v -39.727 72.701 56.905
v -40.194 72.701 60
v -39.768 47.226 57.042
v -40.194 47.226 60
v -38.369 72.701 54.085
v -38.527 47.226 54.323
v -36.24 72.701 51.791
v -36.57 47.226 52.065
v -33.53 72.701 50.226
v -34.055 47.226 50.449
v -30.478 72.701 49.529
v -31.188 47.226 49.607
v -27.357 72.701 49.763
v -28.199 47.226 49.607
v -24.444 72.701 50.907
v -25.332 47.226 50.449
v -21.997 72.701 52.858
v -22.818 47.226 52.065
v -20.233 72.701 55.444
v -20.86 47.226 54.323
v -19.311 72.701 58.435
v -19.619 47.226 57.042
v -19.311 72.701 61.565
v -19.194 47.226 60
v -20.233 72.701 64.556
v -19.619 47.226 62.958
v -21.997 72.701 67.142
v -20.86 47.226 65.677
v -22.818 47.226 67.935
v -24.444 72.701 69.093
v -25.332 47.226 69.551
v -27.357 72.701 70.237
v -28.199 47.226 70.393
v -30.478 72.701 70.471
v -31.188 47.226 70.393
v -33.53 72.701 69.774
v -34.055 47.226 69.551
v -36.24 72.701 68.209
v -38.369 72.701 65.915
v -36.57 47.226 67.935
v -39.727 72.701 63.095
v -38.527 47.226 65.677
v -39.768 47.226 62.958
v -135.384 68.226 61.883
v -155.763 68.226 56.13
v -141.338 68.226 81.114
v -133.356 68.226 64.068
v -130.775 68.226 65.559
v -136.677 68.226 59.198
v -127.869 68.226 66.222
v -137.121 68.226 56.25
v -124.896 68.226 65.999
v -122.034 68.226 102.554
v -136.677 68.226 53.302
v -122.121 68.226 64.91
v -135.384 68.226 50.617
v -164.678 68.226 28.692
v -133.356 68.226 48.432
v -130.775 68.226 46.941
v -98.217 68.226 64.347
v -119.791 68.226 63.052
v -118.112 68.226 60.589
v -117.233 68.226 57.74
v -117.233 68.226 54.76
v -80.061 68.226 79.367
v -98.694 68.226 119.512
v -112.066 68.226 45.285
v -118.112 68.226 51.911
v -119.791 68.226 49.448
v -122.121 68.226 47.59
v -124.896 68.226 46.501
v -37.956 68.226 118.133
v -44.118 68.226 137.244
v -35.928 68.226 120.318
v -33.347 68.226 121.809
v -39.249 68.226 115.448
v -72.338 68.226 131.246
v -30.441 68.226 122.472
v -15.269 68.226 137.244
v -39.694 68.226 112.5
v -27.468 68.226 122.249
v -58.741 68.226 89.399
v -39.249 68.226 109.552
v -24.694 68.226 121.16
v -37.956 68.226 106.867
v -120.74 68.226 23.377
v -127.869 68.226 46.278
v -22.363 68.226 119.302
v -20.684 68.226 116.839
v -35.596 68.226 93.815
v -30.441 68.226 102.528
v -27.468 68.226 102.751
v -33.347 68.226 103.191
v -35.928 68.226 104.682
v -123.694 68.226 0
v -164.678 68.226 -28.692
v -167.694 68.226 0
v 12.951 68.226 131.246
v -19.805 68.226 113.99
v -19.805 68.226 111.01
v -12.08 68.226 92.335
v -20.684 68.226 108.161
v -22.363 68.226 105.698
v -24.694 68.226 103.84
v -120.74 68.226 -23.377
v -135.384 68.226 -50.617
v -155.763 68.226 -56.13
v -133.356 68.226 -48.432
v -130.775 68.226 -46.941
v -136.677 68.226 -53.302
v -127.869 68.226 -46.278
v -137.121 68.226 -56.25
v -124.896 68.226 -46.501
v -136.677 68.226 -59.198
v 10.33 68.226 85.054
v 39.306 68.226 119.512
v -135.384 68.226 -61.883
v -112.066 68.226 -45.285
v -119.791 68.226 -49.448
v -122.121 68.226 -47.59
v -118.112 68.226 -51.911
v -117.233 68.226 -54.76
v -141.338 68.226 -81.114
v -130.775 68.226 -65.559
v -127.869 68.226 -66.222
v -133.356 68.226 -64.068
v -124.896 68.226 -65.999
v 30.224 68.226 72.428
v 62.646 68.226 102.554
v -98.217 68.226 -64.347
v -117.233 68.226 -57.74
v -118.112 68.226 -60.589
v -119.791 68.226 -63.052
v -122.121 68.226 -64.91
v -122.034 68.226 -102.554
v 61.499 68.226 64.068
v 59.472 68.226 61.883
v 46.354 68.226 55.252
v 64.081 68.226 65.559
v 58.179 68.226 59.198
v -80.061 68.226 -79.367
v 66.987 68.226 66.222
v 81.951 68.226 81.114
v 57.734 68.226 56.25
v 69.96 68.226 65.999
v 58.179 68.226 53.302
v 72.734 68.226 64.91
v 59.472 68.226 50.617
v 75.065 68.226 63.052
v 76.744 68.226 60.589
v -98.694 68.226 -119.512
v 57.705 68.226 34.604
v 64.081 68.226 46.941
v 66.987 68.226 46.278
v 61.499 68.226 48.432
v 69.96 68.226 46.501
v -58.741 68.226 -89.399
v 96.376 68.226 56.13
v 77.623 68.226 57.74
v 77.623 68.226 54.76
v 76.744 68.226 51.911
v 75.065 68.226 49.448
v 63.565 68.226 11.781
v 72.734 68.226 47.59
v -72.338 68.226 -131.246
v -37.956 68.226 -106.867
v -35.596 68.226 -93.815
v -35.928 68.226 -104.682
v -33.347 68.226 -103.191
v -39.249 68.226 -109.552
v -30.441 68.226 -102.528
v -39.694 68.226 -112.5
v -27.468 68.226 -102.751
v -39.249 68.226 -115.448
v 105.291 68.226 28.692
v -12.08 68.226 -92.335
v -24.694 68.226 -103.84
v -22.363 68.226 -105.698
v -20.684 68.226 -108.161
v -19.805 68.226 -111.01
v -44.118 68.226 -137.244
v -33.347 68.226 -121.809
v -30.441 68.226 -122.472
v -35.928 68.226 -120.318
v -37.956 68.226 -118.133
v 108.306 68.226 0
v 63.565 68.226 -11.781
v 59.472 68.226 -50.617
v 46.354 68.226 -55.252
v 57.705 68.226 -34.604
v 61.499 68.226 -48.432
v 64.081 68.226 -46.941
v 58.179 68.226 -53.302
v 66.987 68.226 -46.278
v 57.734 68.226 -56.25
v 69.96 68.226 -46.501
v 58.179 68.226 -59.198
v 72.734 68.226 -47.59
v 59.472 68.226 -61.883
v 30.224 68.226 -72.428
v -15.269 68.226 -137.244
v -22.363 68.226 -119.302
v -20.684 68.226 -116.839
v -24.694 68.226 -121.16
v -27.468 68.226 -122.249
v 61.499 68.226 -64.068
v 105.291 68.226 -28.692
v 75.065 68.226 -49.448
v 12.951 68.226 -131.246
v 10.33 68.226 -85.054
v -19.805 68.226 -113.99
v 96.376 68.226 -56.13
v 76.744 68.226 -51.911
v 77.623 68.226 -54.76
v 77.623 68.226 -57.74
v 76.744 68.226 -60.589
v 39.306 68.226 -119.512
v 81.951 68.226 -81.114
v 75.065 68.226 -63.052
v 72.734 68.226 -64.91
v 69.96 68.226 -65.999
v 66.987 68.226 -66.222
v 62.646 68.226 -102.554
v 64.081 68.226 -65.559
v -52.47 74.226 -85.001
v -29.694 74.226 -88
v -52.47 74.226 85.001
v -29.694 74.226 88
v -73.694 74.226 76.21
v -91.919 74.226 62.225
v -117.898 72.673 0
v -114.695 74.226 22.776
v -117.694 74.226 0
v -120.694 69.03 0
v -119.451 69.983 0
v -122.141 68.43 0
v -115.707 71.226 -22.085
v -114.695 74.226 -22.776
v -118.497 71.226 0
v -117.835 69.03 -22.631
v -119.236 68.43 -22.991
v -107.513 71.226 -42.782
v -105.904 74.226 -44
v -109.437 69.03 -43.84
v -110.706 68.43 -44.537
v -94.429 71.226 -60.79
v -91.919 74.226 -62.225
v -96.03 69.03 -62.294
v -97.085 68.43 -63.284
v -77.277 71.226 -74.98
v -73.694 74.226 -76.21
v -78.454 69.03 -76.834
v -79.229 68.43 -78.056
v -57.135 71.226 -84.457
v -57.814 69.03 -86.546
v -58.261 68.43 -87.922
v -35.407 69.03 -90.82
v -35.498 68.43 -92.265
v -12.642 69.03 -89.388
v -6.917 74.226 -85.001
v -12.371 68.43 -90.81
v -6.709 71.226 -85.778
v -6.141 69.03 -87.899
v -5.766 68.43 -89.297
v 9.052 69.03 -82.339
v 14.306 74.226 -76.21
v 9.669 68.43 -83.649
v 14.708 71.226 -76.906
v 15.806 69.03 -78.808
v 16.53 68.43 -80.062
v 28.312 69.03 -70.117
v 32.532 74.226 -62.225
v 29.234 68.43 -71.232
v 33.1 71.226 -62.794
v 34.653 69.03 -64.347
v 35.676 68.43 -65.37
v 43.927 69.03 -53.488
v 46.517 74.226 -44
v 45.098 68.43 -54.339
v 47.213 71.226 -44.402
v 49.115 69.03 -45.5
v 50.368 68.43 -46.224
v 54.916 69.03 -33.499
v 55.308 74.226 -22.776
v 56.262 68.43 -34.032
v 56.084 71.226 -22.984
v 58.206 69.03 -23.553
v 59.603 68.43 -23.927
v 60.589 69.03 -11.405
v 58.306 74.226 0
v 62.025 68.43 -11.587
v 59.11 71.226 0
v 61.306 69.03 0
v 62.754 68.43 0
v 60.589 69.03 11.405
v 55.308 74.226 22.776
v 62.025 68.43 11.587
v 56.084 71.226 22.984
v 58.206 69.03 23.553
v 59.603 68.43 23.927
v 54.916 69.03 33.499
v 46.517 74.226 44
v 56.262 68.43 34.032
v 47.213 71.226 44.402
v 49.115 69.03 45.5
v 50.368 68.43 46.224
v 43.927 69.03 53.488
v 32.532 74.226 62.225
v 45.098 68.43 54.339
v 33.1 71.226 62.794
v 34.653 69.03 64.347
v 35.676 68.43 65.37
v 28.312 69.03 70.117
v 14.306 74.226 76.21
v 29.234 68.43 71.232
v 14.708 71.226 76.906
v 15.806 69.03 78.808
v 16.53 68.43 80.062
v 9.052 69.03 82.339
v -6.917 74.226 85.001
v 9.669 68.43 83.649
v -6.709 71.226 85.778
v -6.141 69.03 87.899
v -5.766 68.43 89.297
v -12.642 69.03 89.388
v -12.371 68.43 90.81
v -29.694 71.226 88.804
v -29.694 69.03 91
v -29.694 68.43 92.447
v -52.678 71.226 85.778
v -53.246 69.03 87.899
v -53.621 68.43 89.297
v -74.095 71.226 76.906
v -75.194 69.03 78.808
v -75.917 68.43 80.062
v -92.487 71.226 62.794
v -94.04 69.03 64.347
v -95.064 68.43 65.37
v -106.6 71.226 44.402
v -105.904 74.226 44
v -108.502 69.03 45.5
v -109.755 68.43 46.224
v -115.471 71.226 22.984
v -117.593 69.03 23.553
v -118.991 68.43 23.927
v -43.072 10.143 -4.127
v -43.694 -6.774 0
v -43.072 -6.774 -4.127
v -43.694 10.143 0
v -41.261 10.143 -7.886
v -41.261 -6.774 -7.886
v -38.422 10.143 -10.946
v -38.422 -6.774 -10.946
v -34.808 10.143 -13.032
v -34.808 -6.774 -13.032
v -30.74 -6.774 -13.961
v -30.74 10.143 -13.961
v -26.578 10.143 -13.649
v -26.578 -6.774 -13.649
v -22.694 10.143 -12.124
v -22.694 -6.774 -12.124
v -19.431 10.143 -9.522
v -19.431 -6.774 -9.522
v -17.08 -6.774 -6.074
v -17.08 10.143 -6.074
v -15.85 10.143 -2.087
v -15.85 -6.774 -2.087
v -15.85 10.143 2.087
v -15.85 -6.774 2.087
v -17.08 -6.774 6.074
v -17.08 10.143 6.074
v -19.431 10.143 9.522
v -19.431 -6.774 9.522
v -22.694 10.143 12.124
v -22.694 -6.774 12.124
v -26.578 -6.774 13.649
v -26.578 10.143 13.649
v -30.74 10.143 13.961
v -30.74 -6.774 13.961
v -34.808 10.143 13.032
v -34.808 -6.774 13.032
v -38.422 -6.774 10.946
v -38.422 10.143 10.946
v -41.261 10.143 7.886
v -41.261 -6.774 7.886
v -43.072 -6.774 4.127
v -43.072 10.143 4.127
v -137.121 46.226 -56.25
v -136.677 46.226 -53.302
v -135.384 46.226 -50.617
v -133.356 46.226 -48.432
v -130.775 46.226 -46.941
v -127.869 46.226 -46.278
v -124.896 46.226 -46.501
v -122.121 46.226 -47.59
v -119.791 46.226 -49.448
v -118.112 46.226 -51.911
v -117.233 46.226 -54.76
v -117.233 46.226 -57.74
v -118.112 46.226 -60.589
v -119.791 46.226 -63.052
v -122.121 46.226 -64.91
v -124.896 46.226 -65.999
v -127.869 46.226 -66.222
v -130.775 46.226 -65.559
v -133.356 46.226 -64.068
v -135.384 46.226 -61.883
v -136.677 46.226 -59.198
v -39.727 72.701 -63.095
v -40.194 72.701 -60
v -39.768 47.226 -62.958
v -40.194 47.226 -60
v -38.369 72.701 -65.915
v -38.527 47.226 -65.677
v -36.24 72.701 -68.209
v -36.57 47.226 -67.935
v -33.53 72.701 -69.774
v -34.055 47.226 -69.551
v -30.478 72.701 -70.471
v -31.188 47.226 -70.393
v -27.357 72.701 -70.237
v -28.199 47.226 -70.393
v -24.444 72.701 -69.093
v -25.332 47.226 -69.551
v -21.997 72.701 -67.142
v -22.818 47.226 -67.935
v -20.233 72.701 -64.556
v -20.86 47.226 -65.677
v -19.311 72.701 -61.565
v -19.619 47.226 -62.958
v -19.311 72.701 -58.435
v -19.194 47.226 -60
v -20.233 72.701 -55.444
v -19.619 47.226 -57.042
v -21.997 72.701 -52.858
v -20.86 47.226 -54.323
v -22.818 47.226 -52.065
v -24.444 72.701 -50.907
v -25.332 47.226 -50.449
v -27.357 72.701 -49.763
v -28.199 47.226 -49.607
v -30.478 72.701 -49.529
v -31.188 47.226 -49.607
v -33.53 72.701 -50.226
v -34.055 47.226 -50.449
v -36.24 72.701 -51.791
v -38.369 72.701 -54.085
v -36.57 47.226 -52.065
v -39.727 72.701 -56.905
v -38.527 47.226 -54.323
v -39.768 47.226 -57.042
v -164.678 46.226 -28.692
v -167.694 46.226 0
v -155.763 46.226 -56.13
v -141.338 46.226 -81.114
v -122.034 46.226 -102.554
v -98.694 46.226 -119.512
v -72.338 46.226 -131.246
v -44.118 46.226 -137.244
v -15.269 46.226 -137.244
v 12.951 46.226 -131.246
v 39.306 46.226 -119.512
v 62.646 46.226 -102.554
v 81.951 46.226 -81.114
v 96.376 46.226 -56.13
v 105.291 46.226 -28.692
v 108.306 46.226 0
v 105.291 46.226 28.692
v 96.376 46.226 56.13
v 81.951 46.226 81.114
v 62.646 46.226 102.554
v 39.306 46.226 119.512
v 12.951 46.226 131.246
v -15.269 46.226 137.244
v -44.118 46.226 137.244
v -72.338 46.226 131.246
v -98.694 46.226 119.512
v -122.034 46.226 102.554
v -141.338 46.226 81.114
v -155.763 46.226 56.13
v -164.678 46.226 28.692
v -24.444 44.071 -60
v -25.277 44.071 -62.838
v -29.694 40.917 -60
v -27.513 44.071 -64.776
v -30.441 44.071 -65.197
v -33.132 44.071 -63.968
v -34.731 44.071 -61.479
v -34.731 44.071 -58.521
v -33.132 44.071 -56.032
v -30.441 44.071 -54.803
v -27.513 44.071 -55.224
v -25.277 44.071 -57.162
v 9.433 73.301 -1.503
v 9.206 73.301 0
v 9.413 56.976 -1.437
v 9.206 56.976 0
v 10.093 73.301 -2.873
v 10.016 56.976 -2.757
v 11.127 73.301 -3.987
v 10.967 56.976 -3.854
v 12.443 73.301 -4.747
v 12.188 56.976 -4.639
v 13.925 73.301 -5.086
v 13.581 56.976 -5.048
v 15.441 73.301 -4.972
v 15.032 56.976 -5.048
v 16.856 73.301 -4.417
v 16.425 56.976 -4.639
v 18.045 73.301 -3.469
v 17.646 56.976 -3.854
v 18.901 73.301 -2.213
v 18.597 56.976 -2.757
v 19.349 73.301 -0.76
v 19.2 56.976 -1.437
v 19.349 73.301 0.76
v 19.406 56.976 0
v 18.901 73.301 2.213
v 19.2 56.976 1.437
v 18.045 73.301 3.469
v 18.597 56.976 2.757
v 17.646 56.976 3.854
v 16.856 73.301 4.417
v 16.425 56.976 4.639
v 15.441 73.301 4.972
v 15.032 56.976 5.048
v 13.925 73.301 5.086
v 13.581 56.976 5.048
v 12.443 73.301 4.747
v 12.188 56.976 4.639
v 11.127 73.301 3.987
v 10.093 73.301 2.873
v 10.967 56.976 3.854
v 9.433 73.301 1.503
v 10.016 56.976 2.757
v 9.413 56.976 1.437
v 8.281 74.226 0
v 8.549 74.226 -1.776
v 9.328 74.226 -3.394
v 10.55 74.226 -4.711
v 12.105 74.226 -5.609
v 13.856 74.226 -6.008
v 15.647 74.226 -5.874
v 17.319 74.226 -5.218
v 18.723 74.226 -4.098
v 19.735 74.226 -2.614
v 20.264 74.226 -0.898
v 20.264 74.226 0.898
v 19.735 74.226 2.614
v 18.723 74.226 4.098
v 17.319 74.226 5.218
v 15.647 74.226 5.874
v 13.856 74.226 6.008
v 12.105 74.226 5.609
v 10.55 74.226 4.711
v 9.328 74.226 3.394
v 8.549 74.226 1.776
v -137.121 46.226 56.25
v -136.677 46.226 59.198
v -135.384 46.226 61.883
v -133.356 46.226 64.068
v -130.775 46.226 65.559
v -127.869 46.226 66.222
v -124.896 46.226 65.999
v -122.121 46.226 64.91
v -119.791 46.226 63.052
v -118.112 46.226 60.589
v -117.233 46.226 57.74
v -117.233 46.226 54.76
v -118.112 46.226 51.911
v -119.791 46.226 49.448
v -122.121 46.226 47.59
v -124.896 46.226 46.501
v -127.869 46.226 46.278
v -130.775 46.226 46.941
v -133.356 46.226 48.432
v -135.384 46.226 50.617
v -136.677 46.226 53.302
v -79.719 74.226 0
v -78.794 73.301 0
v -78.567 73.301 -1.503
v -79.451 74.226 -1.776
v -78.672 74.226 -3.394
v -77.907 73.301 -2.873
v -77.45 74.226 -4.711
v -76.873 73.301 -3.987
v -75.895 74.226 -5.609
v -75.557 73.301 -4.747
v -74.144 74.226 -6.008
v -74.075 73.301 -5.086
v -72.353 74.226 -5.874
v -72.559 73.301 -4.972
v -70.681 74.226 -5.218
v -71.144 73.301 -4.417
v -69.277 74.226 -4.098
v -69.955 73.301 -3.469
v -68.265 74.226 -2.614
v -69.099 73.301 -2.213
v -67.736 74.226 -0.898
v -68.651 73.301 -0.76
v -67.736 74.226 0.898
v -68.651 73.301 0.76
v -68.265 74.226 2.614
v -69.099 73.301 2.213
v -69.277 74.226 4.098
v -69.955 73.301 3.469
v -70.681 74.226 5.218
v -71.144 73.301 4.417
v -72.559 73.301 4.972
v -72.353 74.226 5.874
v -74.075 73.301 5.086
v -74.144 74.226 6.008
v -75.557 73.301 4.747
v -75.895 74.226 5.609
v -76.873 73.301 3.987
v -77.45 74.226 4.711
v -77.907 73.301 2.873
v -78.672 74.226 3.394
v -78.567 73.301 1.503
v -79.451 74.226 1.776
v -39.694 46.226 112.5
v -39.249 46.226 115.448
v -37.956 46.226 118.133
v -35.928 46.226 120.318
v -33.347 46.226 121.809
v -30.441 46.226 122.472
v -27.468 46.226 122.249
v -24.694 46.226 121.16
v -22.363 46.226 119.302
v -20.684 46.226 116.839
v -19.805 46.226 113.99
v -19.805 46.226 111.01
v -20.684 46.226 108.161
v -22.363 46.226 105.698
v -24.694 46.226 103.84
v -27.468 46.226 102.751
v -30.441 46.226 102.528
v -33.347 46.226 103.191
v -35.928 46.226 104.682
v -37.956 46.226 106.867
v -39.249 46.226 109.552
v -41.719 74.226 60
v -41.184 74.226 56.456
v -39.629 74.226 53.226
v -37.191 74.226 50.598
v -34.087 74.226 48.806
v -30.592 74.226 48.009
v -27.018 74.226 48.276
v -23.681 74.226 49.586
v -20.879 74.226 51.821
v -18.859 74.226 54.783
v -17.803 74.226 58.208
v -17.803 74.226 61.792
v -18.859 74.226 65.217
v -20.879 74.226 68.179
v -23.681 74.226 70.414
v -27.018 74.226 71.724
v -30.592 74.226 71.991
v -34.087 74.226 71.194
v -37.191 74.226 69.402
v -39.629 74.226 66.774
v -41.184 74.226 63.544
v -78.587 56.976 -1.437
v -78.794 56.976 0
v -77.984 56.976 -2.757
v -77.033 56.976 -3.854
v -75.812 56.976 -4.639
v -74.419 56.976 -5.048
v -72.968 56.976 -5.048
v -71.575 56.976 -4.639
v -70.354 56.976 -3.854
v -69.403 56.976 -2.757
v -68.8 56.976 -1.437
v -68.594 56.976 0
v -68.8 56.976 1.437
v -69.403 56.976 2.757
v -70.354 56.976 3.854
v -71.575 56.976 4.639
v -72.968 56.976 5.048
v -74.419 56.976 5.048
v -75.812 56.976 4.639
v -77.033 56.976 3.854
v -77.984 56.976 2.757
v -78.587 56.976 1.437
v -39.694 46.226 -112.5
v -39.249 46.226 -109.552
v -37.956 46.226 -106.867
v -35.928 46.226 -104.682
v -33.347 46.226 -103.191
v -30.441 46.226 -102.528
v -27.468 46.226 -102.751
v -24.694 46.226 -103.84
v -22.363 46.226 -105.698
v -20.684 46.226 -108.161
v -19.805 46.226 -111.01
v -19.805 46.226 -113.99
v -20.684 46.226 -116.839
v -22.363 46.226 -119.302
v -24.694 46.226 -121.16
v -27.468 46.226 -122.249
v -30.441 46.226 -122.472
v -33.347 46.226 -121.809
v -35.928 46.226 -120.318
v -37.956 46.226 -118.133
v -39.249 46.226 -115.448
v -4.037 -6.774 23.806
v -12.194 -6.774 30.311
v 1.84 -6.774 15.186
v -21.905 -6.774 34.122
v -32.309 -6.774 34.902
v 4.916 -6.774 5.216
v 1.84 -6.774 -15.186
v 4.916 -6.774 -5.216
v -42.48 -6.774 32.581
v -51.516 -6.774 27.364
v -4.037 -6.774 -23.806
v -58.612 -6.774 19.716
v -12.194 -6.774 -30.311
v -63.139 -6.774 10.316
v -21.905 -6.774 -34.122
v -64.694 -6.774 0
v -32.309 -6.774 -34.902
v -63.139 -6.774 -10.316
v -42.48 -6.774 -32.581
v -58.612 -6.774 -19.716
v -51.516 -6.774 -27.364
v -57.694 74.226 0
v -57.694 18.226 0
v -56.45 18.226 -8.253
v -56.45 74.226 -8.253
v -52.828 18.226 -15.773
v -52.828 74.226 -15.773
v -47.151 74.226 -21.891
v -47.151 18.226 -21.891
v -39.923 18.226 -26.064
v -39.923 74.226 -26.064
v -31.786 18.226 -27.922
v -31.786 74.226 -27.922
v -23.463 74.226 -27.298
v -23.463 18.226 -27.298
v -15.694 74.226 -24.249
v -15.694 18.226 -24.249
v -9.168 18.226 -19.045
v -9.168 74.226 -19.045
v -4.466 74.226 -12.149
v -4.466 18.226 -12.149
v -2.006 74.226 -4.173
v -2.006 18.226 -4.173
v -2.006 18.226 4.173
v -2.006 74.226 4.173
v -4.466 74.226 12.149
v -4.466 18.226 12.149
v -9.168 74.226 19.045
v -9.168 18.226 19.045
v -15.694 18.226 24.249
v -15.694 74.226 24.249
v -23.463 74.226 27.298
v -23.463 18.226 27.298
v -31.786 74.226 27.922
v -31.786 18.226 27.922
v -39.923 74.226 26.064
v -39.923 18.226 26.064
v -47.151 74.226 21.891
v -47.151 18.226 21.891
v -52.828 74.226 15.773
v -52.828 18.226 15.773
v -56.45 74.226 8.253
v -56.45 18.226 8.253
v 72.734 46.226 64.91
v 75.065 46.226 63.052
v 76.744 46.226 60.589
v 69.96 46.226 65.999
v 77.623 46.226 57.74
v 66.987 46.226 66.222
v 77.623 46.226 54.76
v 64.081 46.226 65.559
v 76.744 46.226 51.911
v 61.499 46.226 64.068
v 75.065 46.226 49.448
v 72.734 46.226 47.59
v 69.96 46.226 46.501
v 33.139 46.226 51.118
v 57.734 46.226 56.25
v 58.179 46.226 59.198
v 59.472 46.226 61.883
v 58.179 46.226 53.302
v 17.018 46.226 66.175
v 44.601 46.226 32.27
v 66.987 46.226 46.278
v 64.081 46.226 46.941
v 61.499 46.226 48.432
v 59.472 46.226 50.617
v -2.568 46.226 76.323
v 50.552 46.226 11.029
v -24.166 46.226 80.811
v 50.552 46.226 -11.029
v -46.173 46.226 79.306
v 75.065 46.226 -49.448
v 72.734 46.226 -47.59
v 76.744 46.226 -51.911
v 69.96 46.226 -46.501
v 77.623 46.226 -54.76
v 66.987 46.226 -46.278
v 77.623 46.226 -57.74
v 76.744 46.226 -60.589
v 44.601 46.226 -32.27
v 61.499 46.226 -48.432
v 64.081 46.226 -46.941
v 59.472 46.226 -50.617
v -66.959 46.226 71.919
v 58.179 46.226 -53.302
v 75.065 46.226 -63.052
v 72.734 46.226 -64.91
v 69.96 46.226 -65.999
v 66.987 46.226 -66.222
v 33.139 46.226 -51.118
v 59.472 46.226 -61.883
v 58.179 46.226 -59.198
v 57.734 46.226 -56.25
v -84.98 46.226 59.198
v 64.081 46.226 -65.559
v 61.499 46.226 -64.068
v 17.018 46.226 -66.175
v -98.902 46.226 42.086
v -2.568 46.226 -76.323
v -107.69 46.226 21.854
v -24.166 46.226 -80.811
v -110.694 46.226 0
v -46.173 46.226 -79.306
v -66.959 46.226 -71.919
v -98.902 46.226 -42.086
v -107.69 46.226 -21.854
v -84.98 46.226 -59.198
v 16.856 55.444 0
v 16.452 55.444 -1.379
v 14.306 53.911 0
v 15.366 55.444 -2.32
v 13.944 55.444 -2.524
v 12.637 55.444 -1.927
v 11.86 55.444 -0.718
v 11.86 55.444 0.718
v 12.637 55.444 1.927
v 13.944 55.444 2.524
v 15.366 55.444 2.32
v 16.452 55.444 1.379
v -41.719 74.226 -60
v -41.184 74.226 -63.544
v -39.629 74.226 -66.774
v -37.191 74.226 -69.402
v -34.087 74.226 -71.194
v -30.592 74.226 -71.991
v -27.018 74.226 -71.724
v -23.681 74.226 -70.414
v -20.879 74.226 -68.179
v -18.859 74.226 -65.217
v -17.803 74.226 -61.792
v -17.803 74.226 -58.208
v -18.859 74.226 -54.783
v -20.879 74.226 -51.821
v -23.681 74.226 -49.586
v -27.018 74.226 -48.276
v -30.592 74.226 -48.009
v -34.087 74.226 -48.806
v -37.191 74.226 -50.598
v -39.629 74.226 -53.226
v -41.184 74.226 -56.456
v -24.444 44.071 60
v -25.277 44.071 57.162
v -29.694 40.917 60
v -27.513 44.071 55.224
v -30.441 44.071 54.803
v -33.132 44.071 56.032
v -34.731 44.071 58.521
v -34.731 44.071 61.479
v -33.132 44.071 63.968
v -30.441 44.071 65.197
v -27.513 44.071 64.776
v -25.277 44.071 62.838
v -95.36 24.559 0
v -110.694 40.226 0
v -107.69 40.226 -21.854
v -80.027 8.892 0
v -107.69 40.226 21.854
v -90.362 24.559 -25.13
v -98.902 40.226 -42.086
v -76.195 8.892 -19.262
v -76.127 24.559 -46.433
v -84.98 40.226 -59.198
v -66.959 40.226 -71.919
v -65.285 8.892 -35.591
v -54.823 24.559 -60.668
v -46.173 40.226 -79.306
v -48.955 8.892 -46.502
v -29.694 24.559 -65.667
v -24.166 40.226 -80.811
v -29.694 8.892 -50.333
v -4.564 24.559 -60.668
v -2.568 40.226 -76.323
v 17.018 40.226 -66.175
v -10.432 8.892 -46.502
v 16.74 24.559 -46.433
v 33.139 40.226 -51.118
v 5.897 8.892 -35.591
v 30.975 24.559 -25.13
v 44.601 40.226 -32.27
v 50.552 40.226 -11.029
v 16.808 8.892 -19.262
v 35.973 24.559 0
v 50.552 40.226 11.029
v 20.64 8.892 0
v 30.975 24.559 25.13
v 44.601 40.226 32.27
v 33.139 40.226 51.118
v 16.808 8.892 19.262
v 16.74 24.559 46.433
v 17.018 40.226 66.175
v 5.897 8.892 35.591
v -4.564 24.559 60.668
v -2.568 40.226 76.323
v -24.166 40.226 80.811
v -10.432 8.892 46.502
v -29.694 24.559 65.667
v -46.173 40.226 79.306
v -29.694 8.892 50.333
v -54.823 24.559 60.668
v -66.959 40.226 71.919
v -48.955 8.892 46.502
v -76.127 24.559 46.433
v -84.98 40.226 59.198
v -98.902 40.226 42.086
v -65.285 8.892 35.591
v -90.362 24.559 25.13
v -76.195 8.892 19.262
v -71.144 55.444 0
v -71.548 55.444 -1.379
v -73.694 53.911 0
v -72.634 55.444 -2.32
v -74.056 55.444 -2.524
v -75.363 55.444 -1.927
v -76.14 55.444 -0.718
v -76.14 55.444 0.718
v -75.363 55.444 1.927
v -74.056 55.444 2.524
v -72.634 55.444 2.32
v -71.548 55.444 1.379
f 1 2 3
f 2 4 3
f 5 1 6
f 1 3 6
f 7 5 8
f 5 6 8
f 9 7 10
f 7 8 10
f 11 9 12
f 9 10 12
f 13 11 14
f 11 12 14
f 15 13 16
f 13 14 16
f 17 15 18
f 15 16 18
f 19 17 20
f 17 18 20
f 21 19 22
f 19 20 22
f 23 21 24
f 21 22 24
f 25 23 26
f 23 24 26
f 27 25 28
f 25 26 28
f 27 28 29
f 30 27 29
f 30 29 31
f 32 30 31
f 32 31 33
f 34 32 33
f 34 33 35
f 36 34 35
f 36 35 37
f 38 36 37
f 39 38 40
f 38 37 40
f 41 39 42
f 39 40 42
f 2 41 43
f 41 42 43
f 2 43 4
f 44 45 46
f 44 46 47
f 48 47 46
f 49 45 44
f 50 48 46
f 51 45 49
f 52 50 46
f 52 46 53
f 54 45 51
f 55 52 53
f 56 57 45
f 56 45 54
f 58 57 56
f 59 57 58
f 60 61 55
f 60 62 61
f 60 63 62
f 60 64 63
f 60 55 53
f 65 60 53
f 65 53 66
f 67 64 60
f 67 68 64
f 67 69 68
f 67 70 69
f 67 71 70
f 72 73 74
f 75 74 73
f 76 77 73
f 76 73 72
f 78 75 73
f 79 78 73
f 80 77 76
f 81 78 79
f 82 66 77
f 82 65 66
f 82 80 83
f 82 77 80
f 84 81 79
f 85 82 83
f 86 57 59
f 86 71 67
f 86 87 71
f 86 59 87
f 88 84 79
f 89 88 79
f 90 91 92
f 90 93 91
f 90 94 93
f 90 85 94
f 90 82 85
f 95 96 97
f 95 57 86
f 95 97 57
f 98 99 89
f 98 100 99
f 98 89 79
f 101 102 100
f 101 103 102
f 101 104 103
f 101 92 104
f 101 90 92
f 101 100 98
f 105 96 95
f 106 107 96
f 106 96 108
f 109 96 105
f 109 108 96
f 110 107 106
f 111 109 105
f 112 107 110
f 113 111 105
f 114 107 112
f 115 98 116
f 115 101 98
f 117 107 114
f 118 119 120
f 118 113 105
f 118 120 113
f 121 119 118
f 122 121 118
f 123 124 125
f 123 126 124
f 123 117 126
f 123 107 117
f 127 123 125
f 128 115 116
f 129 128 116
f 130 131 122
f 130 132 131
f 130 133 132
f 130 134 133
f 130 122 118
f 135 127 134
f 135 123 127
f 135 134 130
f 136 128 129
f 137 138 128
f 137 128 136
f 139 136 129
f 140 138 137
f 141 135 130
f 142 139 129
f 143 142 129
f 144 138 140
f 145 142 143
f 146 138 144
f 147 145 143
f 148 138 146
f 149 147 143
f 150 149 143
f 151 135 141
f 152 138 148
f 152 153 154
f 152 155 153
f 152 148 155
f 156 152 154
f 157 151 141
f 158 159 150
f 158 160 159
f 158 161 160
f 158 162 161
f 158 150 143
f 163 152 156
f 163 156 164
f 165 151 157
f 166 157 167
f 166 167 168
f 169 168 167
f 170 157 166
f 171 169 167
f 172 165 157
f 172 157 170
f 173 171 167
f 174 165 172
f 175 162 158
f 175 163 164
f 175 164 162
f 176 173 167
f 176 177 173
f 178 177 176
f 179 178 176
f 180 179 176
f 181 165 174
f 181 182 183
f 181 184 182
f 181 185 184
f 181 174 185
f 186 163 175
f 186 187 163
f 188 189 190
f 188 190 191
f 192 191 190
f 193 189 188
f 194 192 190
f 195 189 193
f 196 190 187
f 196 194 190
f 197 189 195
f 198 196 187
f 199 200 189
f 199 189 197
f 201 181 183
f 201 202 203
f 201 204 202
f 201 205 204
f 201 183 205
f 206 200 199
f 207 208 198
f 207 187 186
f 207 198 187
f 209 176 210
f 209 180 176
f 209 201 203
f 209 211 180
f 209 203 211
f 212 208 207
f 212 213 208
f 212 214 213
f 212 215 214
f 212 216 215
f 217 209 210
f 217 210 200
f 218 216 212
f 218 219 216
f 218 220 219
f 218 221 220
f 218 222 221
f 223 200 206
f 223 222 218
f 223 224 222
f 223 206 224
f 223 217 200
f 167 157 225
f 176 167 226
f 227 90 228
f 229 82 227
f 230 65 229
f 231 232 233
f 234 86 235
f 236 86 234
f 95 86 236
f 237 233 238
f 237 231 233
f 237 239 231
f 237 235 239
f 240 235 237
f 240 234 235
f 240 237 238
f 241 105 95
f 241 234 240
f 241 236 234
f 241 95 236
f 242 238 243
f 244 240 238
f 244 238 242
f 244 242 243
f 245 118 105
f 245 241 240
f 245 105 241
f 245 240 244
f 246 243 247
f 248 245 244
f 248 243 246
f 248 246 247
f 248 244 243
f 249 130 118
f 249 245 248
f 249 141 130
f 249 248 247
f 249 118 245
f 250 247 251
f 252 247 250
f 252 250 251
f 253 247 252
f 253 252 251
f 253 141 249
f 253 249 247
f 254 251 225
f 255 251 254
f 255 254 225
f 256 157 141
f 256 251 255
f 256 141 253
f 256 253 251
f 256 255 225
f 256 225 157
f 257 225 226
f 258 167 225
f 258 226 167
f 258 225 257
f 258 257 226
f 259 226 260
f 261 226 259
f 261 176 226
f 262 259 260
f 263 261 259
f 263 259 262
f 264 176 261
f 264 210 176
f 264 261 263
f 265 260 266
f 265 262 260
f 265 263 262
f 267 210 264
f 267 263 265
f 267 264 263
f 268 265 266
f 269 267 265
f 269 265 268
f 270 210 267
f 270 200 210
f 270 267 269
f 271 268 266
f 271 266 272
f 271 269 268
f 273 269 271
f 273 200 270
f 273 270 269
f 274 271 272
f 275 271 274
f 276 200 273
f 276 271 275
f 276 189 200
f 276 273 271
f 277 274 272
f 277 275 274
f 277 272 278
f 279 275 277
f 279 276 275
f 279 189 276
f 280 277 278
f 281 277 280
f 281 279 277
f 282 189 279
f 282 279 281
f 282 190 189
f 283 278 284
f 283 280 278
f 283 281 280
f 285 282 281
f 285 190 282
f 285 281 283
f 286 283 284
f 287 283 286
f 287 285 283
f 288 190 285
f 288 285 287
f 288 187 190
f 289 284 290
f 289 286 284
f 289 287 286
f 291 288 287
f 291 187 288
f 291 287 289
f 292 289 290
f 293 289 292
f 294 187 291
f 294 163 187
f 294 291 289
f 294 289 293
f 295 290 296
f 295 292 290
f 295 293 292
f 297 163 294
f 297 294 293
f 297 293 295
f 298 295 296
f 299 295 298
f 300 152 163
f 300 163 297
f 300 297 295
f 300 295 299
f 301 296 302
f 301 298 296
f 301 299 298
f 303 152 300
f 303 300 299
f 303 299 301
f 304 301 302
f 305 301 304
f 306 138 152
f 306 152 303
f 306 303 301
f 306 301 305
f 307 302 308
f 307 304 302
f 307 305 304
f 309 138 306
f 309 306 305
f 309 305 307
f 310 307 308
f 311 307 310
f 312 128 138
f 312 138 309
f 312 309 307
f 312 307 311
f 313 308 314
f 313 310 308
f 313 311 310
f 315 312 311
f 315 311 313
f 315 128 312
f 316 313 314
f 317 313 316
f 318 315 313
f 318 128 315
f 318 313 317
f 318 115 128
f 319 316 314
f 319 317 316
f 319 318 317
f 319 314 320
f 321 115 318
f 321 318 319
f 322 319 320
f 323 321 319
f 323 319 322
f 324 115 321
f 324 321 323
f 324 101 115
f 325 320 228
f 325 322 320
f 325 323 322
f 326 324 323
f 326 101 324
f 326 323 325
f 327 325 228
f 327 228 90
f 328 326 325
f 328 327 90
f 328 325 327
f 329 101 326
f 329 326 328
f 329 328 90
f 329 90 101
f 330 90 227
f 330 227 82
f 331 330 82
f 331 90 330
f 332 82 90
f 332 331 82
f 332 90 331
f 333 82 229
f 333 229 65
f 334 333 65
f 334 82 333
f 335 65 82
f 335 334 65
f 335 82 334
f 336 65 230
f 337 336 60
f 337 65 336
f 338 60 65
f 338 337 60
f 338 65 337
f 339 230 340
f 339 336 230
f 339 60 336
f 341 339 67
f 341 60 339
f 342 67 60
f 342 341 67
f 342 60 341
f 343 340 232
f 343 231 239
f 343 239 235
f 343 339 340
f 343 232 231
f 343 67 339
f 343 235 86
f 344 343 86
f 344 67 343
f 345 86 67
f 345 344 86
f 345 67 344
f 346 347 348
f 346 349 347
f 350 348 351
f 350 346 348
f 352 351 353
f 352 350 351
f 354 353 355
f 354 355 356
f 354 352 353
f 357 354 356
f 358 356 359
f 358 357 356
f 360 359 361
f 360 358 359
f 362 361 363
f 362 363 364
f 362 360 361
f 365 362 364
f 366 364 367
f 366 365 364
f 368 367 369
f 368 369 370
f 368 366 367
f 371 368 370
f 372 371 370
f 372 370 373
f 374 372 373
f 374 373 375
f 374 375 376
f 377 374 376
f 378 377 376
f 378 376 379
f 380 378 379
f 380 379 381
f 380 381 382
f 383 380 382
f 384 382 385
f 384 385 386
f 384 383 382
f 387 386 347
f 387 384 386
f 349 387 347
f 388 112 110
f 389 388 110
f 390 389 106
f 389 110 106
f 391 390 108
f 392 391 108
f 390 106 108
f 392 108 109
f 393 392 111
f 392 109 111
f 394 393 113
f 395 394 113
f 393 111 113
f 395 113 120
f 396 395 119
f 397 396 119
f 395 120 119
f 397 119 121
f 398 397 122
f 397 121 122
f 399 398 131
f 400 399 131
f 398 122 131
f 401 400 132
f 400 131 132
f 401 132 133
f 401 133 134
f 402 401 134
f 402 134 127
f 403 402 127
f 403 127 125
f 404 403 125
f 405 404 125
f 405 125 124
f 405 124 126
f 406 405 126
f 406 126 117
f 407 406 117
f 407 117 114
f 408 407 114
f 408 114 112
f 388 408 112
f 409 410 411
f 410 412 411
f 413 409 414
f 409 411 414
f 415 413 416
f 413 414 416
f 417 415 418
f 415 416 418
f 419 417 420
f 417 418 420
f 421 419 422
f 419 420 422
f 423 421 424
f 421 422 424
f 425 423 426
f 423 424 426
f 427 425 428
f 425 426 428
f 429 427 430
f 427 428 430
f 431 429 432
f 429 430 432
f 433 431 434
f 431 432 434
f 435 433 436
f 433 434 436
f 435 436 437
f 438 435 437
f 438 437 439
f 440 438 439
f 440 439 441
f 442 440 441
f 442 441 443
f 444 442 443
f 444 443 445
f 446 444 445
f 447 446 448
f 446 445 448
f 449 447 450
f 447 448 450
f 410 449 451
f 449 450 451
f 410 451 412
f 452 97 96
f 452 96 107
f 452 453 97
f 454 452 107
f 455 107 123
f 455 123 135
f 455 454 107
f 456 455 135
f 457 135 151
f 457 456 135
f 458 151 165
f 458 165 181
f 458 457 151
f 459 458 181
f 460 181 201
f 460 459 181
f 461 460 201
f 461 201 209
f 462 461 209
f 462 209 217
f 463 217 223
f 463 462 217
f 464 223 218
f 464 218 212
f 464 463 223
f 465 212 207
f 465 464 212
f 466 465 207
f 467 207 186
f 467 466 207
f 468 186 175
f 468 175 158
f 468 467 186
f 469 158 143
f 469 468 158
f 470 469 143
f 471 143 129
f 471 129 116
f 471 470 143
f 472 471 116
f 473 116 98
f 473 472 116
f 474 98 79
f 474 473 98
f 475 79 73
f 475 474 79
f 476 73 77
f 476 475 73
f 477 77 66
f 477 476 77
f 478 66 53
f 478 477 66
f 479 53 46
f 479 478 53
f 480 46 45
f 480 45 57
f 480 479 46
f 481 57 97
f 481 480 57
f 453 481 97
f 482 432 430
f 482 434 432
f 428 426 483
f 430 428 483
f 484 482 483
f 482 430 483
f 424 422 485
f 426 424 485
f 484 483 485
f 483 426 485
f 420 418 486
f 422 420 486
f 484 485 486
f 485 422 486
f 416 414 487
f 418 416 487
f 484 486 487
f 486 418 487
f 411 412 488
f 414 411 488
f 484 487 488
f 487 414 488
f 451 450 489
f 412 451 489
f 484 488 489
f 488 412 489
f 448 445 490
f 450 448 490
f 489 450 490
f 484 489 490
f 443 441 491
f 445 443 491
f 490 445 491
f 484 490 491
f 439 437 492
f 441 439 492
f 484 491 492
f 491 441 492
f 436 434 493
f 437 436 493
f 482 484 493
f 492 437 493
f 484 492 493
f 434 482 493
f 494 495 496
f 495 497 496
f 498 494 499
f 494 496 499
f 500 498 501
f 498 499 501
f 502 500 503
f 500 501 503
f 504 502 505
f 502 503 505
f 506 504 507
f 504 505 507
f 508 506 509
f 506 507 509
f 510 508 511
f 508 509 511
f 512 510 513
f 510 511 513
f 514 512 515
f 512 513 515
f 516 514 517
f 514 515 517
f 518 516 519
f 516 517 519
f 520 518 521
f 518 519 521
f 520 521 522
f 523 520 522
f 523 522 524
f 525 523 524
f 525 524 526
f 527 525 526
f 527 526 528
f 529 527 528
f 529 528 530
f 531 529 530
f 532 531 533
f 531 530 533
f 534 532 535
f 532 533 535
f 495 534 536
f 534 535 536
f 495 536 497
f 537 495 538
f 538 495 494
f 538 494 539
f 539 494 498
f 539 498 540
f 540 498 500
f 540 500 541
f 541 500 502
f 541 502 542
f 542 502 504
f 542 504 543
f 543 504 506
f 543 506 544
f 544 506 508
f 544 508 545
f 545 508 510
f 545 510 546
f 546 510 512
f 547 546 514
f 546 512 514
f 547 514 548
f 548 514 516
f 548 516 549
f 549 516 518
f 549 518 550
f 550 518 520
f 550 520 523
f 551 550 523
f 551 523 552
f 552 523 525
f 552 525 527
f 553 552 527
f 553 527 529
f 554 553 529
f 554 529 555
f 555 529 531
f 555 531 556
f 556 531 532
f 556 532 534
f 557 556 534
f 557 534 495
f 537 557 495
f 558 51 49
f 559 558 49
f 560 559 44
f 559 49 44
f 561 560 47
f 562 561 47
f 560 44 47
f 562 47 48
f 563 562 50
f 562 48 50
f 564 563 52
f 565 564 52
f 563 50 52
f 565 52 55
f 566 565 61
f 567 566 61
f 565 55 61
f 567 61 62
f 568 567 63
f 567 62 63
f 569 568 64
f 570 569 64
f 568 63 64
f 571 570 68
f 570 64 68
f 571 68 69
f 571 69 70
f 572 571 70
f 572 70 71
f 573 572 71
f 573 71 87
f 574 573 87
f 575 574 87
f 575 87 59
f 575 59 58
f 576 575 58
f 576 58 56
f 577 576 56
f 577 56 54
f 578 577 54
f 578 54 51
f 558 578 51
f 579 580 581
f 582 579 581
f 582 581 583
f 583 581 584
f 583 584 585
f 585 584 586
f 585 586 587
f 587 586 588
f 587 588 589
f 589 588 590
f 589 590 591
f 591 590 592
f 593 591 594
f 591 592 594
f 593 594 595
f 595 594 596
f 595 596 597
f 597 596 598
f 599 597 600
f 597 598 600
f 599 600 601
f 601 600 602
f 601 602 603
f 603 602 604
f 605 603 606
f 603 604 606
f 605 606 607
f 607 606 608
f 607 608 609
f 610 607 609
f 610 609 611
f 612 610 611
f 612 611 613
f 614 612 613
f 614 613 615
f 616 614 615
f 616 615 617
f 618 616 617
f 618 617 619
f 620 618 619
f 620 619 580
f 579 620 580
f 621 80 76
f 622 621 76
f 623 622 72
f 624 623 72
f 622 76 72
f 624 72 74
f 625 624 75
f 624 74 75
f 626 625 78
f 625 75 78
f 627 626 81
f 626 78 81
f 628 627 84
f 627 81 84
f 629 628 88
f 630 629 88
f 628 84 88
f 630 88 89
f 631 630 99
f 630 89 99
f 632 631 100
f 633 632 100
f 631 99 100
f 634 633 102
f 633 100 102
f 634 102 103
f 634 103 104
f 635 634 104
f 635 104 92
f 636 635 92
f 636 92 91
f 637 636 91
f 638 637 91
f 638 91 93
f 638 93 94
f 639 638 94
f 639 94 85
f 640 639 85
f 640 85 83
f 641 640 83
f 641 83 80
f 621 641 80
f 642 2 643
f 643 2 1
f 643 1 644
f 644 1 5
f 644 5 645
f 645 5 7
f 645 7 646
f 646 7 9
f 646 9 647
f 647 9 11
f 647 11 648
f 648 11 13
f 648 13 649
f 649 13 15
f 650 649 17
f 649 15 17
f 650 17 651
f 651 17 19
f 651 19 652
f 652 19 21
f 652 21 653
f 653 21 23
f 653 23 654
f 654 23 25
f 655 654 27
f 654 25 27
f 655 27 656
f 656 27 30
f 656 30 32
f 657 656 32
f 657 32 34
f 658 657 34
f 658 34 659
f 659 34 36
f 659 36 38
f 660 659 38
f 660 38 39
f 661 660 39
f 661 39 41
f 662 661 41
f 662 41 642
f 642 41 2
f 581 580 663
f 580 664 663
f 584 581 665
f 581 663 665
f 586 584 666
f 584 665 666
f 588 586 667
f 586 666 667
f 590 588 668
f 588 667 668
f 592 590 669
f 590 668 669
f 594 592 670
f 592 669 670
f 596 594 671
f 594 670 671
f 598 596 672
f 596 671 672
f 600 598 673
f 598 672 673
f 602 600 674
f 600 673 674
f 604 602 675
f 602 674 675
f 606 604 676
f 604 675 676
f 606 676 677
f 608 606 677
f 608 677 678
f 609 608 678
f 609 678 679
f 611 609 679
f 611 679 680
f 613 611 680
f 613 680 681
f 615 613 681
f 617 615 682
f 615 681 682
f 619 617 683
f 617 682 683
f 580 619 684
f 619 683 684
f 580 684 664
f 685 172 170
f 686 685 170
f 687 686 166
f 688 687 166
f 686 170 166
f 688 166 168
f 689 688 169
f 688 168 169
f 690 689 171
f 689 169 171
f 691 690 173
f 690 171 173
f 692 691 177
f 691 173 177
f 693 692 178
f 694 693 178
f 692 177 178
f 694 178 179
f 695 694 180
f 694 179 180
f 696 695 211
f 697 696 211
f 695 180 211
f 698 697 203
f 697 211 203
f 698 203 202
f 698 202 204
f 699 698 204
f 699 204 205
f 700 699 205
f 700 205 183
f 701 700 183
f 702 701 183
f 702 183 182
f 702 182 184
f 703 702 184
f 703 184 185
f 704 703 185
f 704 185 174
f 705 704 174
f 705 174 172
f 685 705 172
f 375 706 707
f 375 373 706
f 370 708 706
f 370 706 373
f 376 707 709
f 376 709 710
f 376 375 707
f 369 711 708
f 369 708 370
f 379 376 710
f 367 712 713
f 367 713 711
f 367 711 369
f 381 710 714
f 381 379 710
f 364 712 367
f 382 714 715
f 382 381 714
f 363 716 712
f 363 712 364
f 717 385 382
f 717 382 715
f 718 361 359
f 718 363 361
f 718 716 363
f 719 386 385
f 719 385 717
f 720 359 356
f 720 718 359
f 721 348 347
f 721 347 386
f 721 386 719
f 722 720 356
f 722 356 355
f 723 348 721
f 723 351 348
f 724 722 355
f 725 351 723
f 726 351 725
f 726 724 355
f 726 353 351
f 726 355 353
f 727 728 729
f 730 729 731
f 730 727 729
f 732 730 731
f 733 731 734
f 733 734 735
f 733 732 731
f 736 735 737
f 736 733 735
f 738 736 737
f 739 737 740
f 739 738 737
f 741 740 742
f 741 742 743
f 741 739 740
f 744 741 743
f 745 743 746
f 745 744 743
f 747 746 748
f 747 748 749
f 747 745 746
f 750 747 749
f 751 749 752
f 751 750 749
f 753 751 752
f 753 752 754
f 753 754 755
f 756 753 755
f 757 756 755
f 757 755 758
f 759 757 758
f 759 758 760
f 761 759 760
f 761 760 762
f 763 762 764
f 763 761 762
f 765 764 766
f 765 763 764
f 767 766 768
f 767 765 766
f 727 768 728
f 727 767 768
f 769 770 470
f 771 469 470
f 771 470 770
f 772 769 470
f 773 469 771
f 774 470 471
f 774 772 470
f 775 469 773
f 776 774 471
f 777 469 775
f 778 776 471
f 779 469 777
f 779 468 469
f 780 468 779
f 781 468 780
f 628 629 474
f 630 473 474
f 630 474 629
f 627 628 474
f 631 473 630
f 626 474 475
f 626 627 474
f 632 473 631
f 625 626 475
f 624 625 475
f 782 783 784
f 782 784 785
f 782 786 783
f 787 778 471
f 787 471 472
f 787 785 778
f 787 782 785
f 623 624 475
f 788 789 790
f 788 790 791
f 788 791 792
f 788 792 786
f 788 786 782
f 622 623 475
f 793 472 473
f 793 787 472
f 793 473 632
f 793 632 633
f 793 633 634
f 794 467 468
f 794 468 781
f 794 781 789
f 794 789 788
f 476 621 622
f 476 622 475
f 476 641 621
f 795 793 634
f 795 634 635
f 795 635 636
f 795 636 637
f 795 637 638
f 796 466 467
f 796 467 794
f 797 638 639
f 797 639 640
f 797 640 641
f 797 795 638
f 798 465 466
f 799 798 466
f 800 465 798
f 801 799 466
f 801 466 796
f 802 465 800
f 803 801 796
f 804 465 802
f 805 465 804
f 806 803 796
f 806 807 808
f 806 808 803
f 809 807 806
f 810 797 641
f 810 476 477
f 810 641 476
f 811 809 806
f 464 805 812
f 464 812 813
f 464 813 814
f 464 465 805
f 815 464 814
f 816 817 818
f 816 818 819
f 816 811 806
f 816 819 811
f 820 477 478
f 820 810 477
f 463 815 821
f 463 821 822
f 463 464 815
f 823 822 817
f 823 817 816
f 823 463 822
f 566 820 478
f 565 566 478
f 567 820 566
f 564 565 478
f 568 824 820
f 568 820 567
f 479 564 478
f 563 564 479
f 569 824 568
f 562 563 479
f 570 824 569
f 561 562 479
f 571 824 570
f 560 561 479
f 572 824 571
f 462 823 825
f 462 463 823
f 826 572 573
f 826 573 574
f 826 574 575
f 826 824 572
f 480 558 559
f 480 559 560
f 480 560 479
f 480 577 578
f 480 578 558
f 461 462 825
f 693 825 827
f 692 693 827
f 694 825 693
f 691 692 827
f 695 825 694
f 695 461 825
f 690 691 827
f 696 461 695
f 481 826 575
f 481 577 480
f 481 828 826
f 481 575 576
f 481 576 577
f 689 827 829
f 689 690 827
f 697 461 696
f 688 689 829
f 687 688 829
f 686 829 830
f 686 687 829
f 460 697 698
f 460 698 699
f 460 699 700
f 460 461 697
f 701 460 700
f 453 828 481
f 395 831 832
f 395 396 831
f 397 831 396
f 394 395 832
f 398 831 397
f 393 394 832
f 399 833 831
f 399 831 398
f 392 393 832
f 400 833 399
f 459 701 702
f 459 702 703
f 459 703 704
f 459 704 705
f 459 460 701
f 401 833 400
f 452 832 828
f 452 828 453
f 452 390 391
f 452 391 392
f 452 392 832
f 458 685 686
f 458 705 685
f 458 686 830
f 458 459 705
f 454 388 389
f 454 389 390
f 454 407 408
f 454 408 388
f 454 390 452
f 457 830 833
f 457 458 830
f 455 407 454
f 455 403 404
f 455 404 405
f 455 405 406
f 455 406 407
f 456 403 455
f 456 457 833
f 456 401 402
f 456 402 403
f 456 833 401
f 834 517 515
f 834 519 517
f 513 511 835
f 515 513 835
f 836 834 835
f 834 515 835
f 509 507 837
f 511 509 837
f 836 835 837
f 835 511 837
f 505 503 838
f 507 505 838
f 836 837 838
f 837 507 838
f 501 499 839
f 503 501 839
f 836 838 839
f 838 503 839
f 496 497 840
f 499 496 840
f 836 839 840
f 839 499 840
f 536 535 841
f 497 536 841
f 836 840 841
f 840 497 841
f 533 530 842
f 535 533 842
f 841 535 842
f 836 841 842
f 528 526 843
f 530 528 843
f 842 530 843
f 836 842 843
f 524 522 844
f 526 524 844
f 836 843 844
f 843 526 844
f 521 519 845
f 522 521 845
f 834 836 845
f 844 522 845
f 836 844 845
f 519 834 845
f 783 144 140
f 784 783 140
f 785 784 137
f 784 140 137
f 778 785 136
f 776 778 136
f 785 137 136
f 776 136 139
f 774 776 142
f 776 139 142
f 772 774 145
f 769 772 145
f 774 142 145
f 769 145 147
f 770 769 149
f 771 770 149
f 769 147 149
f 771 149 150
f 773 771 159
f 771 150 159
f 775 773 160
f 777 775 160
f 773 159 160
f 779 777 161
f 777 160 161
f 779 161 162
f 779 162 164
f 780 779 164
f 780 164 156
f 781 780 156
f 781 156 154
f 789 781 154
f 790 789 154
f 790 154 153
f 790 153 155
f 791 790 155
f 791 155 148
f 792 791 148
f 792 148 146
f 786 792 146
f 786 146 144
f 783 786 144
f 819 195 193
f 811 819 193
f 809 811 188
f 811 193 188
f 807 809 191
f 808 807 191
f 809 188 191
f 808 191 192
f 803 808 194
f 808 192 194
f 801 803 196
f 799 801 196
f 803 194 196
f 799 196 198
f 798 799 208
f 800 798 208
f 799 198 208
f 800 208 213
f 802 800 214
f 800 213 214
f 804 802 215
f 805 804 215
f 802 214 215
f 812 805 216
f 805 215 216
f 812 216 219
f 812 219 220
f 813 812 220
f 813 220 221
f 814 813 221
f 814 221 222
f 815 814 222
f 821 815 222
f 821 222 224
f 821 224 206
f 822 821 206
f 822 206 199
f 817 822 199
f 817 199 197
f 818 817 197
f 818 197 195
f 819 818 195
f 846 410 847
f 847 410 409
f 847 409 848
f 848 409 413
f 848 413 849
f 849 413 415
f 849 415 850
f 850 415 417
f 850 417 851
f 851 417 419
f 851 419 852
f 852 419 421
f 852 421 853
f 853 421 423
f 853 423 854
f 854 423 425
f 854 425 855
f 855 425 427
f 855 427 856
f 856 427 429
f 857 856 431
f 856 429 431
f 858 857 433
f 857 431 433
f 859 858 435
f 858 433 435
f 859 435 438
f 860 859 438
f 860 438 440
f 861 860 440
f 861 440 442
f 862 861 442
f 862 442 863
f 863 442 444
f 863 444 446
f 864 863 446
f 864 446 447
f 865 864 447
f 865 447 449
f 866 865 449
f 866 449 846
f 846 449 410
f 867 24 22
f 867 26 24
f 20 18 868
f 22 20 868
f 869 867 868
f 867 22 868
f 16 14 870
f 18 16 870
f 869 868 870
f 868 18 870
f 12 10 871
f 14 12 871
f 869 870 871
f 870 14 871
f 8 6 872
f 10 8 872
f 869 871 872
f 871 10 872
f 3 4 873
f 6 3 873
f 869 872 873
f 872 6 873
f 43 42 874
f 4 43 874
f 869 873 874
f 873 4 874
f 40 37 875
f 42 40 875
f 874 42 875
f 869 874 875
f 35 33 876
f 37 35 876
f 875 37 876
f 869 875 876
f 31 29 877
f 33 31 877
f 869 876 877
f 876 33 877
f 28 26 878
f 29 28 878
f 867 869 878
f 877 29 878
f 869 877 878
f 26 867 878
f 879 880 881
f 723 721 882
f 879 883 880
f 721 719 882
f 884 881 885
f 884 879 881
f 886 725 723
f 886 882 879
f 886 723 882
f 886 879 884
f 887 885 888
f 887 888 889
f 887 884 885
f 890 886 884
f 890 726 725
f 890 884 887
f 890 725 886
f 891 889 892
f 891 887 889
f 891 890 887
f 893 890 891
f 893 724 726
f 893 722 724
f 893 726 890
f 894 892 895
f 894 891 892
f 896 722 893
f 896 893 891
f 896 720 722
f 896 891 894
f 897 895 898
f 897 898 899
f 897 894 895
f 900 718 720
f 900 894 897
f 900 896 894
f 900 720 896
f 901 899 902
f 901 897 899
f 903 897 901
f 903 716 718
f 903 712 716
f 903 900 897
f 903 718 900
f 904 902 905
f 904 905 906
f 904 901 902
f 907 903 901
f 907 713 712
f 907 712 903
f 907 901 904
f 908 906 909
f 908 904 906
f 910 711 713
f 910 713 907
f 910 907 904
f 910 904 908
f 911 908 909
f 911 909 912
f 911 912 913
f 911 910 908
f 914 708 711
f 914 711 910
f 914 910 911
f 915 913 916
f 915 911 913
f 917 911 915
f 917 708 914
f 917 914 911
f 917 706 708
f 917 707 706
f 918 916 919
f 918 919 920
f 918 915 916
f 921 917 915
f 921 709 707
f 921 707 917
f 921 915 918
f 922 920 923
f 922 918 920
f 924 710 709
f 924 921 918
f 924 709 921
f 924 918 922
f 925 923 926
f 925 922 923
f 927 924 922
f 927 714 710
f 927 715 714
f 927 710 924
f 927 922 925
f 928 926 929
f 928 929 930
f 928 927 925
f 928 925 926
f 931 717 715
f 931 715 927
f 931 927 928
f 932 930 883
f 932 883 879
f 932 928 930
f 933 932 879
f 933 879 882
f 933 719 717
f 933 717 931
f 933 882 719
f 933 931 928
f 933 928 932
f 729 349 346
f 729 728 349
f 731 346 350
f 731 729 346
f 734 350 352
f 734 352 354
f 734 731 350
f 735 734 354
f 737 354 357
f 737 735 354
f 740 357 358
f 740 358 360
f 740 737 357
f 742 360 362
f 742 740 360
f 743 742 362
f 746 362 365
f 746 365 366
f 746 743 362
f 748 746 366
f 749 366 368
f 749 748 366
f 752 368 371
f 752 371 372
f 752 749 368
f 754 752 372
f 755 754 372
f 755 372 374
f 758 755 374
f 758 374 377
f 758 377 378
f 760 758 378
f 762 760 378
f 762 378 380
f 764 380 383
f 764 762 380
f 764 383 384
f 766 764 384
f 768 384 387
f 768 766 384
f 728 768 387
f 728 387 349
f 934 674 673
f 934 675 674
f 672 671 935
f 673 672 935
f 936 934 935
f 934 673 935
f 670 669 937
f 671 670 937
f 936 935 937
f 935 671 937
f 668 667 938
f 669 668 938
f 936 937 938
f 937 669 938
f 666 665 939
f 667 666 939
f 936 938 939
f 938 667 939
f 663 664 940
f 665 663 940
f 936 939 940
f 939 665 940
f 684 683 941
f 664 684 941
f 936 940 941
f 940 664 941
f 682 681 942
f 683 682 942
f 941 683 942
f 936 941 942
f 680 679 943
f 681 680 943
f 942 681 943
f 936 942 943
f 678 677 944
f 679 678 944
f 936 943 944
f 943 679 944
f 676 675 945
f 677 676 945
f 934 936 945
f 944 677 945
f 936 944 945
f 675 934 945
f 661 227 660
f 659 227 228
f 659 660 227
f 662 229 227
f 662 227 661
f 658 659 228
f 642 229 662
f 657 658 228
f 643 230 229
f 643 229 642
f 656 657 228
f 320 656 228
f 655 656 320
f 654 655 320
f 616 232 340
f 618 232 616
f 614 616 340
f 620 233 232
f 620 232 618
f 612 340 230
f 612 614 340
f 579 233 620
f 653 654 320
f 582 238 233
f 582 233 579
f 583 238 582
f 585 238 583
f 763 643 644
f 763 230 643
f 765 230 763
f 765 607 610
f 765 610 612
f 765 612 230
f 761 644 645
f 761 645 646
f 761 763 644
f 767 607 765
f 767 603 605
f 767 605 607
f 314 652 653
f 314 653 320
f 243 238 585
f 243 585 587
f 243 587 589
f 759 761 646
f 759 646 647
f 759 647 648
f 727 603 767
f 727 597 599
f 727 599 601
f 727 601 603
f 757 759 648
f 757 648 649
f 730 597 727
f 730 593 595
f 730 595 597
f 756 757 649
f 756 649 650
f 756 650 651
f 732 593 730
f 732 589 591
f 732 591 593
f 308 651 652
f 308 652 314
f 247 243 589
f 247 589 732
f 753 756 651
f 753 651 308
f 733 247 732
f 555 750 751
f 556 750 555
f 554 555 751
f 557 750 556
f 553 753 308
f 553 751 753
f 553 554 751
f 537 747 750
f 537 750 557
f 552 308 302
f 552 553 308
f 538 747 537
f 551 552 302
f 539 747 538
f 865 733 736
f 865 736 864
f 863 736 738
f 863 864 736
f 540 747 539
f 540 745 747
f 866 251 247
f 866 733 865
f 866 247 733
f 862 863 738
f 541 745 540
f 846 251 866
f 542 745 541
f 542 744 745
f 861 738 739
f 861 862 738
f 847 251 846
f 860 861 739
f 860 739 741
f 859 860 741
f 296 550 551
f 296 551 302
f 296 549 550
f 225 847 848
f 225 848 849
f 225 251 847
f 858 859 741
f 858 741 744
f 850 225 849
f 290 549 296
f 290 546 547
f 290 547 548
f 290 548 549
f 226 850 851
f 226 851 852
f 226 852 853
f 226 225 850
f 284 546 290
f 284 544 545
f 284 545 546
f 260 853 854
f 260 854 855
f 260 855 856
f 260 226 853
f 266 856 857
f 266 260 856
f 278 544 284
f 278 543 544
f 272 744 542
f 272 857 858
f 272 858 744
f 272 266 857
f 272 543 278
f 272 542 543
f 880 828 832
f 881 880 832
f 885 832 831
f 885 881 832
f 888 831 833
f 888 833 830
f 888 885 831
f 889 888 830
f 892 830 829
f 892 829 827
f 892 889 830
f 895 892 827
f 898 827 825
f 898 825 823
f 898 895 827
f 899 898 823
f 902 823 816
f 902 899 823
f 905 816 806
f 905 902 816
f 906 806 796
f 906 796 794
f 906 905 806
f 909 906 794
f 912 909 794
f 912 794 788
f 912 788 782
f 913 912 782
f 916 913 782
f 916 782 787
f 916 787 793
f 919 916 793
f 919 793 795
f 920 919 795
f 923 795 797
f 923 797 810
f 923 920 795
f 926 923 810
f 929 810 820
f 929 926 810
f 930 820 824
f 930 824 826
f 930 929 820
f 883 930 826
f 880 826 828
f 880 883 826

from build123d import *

# Parameters (mm, degrees)
SKETCH2_R                    = 10
CUT_EXTRUDE1_DEPTH           = 230.761019694
M24_TAPPED_HOLE1_D           = 21
M24_TAPPED_HOLE1_DEPTH       = 27
M24_TAPPED_HOLE1_CSINK_D     = 24.05
M24_TAPPED_HOLE1_CSINK_ANGLE = 90
M24_TAPPED_HOLE1_TIP         = 6.3090365
M12_TAPPED_HOLE1_D           = 10.2
M12_TAPPED_HOLE1_DEPTH       = 17.25
M12_TAPPED_HOLE1_CSINK_D     = 12.05
M12_TAPPED_HOLE1_CSINK_ANGLE = 90
M12_TAPPED_HOLE1_TIP         = 3.064389157


with BuildPart() as part:
    # Sketch1 → Revolve1 (revolve)
    with BuildSketch(Plane.XY, mode=Mode.PRIVATE) as revolve1_sk:
        with BuildLine():
            Line((5.306451613, -6.774193548), (-15.693548387, -6.774193548))
            Line((-15.693548387, -6.774193548), (-15.693548387, 10.142902683))
            Line((-15.693548387, 10.142902683), (-1.693548387, 18.225806452))
            Line((-1.693548387, 18.225806452), (-1.693548387, 74.225806452))
            Line((-1.693548387, 74.225806452), (58.306451613, 74.225806452))
            ThreePointArc((58.306451613, 74.225806452), (60.063810926, 69.983165764), (64.306451613, 68.225806452))
            Line((64.306451613, 68.225806452), (108.306451613, 68.225806452))
            Line((108.306451613, 68.225806452), (108.306451613, 46.225806452))
            Line((108.306451613, 46.225806452), (51.306451613, 46.225806452))
            Line((51.306451613, 46.225806452), (51.306451613, 40.225806452))
            Line((51.306451613, 40.225806452), (5.306451613, -6.774193548))
        make_face()
    revolve(revolve1_sk.sketch.rotate(Axis((-29.693548387, 26.362903226, 0), (0, -1, 0)), 180), axis=Axis((-29.693548387, 26.362903226, 0), (0, -1, 0)))

    # Sketch2 → Cut-Extrude1 (cut, through all)
    with BuildSketch(Plane(origin=(0, 68.225806452, 0), x_dir=(1, 0, 0), z_dir=(0, 1, 0))):
        with Locations(Location((-29.693548387, 112.5, 0), (0, 0, 180))):
            Circle(SKETCH2_R)
        with Locations(Location((67.734309539, 56.25, 0), (0, 0, 180))):
            Circle(SKETCH2_R)
        with Locations(Location((67.734309539, -56.25, 0), (0, 0, 180))):
            Circle(SKETCH2_R)
        with Locations(Location((-29.693548387, -112.5, 0), (0, 0, 180))):
            Circle(SKETCH2_R)
        with Locations(Location((-127.121406313, -56.25, 0), (0, 0, 180))):
            Circle(SKETCH2_R)
        with Locations(Location((-127.121406313, 56.25, 0), (0, 0, 180))):
            Circle(SKETCH2_R)
    extrude(amount=-CUT_EXTRUDE1_DEPTH, mode=Mode.SUBTRACT)

    # M24 Tapped Hole1
    with Locations(Plane(origin=(0, 74.225806452, 0), x_dir=(1, 0, 0), z_dir=(0, 1, 0))):
        with Locations((-29.693548387, 60), (-29.693548387, -60)):
            CounterSinkHole(M24_TAPPED_HOLE1_D / 2, M24_TAPPED_HOLE1_CSINK_D / 2, depth=M24_TAPPED_HOLE1_DEPTH, counter_sink_angle=M24_TAPPED_HOLE1_CSINK_ANGLE)
            with Locations((0, 0, -(M24_TAPPED_HOLE1_DEPTH + M24_TAPPED_HOLE1_TIP / 2))):  # 118° drill point
                Cone(0, M24_TAPPED_HOLE1_D / 2, M24_TAPPED_HOLE1_TIP, mode=Mode.SUBTRACT)

    # M12 Tapped Hole1
    with Locations(Plane(origin=(0, 74.225806452, 0), x_dir=(1, 0, 0), z_dir=(0, 1, 0))):
        with Locations((14.306451613, 0), (-73.693548387, 0)):
            CounterSinkHole(M12_TAPPED_HOLE1_D / 2, M12_TAPPED_HOLE1_CSINK_D / 2, depth=M12_TAPPED_HOLE1_DEPTH, counter_sink_angle=M12_TAPPED_HOLE1_CSINK_ANGLE)
            with Locations((0, 0, -(M12_TAPPED_HOLE1_DEPTH + M12_TAPPED_HOLE1_TIP / 2))):  # 118° drill point
                Cone(0, M12_TAPPED_HOLE1_D / 2, M12_TAPPED_HOLE1_TIP, mode=Mode.SUBTRACT)


solid = part.part
